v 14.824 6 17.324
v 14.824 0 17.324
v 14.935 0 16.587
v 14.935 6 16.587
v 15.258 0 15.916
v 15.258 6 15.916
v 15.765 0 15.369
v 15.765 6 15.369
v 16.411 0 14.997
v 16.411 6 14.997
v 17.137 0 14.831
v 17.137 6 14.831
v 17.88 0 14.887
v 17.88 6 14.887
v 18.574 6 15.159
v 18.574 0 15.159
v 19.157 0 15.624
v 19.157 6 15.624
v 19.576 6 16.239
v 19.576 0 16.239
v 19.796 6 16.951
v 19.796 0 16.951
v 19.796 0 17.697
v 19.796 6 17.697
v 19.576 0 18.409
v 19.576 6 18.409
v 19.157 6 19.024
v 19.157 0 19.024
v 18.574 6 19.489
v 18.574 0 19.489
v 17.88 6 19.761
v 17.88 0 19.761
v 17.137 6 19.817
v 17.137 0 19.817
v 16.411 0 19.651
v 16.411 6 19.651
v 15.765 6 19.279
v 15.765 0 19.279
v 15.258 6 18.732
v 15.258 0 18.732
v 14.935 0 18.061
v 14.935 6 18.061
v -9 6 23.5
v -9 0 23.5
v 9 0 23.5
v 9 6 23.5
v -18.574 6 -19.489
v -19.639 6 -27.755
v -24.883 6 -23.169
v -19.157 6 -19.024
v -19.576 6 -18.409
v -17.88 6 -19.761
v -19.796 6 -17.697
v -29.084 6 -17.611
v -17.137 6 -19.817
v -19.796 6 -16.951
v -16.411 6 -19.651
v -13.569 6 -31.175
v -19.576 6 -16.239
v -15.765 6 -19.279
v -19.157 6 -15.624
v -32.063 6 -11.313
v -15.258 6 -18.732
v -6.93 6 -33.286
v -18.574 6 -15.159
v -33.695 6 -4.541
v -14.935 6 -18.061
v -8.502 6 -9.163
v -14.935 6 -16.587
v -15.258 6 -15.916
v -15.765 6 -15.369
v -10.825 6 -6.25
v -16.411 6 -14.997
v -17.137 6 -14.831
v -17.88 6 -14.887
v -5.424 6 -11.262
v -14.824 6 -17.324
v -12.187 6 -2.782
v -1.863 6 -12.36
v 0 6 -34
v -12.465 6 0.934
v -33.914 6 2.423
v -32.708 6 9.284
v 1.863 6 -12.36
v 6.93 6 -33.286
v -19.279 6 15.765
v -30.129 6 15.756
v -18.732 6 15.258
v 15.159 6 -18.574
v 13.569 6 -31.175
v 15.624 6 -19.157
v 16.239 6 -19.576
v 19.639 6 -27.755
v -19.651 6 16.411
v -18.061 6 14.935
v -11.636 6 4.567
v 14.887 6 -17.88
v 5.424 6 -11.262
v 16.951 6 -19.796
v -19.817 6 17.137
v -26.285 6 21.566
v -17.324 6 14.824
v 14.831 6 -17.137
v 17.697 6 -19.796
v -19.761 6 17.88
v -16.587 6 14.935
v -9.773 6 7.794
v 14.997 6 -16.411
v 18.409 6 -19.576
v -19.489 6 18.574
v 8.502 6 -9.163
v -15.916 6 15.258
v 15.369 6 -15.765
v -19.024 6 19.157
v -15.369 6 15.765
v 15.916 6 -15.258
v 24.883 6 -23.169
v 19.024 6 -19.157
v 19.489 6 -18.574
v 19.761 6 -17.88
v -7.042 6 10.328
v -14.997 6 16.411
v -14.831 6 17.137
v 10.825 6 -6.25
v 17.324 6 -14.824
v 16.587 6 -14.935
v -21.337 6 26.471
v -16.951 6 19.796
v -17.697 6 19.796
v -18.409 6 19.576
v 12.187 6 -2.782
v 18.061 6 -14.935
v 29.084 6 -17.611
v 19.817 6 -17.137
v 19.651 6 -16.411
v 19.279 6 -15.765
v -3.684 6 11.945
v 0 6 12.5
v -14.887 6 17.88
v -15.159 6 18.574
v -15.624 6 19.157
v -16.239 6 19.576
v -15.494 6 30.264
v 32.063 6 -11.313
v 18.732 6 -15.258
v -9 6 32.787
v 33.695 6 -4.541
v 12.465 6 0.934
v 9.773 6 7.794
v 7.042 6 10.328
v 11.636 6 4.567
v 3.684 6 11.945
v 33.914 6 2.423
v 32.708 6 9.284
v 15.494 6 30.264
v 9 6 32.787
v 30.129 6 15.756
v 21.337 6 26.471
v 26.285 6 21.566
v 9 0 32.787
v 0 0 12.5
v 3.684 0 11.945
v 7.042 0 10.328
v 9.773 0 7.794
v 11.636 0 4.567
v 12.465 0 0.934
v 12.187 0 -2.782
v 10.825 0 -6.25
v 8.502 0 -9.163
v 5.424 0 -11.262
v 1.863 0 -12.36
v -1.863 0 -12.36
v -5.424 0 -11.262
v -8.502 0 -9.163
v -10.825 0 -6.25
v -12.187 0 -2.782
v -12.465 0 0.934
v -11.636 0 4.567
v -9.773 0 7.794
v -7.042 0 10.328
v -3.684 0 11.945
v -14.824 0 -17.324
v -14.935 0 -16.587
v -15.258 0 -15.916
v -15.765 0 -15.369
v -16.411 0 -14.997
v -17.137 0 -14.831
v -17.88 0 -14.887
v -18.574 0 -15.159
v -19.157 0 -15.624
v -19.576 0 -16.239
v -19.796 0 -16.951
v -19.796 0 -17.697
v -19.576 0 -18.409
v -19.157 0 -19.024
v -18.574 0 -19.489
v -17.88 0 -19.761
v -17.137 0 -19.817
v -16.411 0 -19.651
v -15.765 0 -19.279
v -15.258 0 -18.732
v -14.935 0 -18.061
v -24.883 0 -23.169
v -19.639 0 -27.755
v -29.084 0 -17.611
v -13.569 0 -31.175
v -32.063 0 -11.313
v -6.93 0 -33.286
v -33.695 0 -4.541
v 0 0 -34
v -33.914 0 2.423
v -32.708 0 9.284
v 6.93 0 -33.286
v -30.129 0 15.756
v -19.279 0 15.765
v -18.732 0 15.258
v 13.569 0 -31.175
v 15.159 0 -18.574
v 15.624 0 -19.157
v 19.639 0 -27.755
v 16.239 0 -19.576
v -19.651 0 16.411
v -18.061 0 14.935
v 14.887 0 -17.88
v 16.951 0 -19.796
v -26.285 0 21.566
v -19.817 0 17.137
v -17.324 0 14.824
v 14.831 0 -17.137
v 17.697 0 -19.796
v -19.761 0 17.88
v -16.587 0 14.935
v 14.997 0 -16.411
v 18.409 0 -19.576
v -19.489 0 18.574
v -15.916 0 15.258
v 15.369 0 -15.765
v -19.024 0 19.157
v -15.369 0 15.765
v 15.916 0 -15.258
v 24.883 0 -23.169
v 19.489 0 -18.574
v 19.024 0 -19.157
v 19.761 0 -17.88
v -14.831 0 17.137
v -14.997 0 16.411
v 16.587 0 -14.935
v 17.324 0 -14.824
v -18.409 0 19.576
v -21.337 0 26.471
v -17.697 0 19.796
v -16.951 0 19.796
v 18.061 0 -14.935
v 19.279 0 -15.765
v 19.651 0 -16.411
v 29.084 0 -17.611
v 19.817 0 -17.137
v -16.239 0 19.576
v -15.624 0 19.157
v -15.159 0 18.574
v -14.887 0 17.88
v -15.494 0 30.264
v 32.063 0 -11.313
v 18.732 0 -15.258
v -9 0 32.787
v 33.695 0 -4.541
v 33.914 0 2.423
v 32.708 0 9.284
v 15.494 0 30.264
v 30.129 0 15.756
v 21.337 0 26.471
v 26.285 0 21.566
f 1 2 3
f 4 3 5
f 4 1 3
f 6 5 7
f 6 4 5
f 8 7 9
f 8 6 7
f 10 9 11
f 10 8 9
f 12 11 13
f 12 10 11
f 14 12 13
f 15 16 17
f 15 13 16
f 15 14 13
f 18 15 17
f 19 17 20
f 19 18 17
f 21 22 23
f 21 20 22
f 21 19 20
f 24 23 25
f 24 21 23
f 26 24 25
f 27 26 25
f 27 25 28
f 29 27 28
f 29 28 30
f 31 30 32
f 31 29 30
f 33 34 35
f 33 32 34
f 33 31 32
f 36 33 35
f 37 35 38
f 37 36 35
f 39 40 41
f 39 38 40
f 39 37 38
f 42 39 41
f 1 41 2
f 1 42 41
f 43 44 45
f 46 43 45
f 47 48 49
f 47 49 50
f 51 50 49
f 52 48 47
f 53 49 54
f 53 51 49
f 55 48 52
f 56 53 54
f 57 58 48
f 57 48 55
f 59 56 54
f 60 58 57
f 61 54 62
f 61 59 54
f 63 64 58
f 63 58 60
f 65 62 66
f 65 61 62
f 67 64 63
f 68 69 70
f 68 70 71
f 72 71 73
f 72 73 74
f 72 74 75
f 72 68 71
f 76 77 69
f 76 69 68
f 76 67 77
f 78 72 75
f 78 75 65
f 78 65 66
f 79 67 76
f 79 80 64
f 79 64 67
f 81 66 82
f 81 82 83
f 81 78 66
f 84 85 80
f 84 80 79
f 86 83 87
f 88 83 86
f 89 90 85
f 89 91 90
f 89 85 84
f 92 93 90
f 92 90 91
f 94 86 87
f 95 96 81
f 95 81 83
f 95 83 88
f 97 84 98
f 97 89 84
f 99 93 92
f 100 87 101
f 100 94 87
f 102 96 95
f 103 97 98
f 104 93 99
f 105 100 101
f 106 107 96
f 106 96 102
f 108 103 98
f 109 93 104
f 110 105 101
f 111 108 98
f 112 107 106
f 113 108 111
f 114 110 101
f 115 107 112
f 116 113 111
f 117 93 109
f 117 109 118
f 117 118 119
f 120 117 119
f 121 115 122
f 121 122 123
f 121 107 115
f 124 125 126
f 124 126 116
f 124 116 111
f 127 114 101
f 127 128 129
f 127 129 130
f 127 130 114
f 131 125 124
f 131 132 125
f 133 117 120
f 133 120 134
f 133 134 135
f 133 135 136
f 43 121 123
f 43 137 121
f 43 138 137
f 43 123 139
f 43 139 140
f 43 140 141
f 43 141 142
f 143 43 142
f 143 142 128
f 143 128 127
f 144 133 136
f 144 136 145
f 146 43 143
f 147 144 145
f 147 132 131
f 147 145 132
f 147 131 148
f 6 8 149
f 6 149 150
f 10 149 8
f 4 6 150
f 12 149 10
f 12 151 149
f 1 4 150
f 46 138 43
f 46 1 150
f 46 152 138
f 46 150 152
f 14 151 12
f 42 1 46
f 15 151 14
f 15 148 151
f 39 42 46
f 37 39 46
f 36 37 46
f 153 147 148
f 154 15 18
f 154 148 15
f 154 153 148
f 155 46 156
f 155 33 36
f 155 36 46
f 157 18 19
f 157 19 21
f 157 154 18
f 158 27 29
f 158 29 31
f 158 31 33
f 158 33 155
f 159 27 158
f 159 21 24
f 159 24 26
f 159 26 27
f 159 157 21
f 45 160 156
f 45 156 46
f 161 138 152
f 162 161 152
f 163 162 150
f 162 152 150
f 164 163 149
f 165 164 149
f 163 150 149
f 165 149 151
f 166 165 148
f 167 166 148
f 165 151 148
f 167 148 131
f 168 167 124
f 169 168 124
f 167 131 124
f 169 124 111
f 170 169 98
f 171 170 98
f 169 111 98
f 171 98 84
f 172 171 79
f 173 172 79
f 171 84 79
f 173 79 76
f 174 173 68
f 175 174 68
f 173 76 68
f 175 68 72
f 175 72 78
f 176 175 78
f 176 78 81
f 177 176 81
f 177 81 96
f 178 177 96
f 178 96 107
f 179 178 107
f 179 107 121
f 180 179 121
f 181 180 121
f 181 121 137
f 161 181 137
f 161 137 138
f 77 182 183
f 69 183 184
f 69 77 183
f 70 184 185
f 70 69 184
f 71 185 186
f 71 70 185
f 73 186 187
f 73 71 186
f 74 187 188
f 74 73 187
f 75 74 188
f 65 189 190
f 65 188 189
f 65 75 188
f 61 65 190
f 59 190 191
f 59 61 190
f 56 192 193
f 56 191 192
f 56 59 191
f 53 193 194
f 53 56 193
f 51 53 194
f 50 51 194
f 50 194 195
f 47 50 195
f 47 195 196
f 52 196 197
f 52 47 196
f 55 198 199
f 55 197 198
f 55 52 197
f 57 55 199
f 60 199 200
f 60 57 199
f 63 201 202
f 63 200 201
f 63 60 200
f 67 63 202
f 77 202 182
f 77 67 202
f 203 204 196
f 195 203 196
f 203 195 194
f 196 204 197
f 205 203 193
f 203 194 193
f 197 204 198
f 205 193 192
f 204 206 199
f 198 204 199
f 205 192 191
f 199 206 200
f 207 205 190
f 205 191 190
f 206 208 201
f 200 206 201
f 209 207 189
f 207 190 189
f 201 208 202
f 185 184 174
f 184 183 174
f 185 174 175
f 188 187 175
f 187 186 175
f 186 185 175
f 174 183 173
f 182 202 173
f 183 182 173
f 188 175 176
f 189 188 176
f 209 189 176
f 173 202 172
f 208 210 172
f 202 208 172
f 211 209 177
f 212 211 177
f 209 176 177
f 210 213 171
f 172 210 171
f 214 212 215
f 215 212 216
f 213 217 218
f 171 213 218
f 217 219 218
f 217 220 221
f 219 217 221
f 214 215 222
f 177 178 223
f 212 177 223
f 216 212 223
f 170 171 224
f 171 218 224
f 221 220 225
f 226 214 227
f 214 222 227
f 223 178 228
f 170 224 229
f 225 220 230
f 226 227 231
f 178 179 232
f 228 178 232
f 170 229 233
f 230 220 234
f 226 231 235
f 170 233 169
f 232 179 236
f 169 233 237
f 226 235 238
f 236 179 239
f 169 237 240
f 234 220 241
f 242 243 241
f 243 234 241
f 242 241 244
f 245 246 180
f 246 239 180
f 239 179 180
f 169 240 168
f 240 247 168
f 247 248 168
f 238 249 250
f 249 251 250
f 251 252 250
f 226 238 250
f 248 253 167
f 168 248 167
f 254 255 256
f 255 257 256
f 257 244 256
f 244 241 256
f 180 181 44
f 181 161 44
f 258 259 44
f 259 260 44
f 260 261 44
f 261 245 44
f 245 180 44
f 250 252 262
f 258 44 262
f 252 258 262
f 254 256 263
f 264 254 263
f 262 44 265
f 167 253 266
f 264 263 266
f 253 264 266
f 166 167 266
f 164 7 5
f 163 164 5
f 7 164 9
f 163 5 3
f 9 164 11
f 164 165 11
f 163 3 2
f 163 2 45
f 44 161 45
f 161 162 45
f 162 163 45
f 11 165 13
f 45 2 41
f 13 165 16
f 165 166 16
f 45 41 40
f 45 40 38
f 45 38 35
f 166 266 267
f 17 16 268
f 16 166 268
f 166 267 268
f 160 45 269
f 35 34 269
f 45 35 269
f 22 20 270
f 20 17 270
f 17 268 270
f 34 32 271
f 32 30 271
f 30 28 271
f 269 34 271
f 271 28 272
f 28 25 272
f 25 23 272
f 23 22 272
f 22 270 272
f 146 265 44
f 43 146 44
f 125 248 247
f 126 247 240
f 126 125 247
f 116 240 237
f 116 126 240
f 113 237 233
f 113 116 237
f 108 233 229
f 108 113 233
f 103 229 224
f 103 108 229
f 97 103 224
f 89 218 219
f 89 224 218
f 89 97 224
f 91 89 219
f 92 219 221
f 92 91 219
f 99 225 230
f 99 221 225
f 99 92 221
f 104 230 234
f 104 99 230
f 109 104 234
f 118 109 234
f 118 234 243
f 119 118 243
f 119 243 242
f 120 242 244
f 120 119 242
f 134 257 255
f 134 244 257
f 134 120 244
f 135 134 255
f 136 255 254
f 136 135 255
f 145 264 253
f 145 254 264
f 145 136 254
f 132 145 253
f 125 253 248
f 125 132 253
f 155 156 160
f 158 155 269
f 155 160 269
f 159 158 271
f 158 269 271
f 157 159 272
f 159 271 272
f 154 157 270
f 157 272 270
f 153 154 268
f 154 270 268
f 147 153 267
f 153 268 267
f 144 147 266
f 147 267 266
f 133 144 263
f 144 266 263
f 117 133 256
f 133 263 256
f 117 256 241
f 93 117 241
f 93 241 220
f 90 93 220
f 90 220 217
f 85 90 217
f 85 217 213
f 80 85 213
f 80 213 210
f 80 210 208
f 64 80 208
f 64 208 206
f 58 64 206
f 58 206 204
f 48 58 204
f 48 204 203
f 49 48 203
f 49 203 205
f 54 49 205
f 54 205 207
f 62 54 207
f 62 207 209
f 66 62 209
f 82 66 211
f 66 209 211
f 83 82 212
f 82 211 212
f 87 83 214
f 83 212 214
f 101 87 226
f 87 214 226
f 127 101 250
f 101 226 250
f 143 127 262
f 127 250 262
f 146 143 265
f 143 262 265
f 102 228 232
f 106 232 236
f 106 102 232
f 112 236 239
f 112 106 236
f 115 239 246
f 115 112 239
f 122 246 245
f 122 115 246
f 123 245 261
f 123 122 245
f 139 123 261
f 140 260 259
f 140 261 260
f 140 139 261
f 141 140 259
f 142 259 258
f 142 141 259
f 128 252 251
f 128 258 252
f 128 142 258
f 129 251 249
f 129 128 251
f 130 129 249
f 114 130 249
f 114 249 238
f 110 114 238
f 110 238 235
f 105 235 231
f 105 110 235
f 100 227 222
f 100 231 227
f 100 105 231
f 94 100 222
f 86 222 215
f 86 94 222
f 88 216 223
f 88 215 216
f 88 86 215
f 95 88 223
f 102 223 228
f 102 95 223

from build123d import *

# Parameters (mm, degrees)
SKETCH1_R           = 34
BOSS_EXTRUDE1_DEPTH = 6
CIRPATTERN1_COUNT   = 4
SKETCH5_R           = 12.5
CUT_EXTRUDE1_DEPTH  = 49.456165758
SKETCH7_W           = 18
SKETCH7_H           = 56.5
CUT_EXTRUDE4_DEPTH  = 49.456165758


with BuildPart() as part:
    # Sketch1 → Boss-Extrude1 (new body)
    with BuildSketch(Plane(origin=(0, 0, 0), x_dir=(1, 0, 0), z_dir=(0, 1, 0))):
        Circle(SKETCH1_R)
    extrude(amount=BOSS_EXTRUDE1_DEPTH)

    # Sketch3 → Hole1 (revolve, cut)
    with BuildSketch(Plane(origin=(17.324, 6, -17.324), x_dir=(0, 0, 1), z_dir=(1, 0, 0))):
        Polygon((0, 0), (0, 11.502151548), (2.5, 10), (2.5, 0), align=None)
    hole1 = revolve(axis=Axis((17.324, 12.35, -17.324), (0, -1, 0)), mode=Mode.SUBTRACT)

    # CirPattern1: Hole1 ×4 about axis
    cirpattern1_axis = Axis((0, 50, 0), (0, -1, 0))
    for i in range(1, CIRPATTERN1_COUNT):
        add(hole1.rotate(cirpattern1_axis, i * 360 / CIRPATTERN1_COUNT), mode=Mode.SUBTRACT)

    # Sketch5 → Cut-Extrude1 (cut, through all)
    with BuildSketch(Plane(origin=(0, 6, 0), x_dir=(1, 0, 0), z_dir=(0, 1, 0))):
        Circle(SKETCH5_R)
    extrude(amount=-CUT_EXTRUDE1_DEPTH, mode=Mode.SUBTRACT)

    # Sketch7 → Cut-Extrude4 (cut, through all)
    with BuildSketch(Plane(origin=(0, 0, 0), x_dir=(1, 0, 0), z_dir=(0, 1, 0))):
        with Locations((0, -51.75)):
            Rectangle(SKETCH7_W, SKETCH7_H)
    extrude(amount=CUT_EXTRUDE4_DEPTH, mode=Mode.SUBTRACT)


solid = part.part
